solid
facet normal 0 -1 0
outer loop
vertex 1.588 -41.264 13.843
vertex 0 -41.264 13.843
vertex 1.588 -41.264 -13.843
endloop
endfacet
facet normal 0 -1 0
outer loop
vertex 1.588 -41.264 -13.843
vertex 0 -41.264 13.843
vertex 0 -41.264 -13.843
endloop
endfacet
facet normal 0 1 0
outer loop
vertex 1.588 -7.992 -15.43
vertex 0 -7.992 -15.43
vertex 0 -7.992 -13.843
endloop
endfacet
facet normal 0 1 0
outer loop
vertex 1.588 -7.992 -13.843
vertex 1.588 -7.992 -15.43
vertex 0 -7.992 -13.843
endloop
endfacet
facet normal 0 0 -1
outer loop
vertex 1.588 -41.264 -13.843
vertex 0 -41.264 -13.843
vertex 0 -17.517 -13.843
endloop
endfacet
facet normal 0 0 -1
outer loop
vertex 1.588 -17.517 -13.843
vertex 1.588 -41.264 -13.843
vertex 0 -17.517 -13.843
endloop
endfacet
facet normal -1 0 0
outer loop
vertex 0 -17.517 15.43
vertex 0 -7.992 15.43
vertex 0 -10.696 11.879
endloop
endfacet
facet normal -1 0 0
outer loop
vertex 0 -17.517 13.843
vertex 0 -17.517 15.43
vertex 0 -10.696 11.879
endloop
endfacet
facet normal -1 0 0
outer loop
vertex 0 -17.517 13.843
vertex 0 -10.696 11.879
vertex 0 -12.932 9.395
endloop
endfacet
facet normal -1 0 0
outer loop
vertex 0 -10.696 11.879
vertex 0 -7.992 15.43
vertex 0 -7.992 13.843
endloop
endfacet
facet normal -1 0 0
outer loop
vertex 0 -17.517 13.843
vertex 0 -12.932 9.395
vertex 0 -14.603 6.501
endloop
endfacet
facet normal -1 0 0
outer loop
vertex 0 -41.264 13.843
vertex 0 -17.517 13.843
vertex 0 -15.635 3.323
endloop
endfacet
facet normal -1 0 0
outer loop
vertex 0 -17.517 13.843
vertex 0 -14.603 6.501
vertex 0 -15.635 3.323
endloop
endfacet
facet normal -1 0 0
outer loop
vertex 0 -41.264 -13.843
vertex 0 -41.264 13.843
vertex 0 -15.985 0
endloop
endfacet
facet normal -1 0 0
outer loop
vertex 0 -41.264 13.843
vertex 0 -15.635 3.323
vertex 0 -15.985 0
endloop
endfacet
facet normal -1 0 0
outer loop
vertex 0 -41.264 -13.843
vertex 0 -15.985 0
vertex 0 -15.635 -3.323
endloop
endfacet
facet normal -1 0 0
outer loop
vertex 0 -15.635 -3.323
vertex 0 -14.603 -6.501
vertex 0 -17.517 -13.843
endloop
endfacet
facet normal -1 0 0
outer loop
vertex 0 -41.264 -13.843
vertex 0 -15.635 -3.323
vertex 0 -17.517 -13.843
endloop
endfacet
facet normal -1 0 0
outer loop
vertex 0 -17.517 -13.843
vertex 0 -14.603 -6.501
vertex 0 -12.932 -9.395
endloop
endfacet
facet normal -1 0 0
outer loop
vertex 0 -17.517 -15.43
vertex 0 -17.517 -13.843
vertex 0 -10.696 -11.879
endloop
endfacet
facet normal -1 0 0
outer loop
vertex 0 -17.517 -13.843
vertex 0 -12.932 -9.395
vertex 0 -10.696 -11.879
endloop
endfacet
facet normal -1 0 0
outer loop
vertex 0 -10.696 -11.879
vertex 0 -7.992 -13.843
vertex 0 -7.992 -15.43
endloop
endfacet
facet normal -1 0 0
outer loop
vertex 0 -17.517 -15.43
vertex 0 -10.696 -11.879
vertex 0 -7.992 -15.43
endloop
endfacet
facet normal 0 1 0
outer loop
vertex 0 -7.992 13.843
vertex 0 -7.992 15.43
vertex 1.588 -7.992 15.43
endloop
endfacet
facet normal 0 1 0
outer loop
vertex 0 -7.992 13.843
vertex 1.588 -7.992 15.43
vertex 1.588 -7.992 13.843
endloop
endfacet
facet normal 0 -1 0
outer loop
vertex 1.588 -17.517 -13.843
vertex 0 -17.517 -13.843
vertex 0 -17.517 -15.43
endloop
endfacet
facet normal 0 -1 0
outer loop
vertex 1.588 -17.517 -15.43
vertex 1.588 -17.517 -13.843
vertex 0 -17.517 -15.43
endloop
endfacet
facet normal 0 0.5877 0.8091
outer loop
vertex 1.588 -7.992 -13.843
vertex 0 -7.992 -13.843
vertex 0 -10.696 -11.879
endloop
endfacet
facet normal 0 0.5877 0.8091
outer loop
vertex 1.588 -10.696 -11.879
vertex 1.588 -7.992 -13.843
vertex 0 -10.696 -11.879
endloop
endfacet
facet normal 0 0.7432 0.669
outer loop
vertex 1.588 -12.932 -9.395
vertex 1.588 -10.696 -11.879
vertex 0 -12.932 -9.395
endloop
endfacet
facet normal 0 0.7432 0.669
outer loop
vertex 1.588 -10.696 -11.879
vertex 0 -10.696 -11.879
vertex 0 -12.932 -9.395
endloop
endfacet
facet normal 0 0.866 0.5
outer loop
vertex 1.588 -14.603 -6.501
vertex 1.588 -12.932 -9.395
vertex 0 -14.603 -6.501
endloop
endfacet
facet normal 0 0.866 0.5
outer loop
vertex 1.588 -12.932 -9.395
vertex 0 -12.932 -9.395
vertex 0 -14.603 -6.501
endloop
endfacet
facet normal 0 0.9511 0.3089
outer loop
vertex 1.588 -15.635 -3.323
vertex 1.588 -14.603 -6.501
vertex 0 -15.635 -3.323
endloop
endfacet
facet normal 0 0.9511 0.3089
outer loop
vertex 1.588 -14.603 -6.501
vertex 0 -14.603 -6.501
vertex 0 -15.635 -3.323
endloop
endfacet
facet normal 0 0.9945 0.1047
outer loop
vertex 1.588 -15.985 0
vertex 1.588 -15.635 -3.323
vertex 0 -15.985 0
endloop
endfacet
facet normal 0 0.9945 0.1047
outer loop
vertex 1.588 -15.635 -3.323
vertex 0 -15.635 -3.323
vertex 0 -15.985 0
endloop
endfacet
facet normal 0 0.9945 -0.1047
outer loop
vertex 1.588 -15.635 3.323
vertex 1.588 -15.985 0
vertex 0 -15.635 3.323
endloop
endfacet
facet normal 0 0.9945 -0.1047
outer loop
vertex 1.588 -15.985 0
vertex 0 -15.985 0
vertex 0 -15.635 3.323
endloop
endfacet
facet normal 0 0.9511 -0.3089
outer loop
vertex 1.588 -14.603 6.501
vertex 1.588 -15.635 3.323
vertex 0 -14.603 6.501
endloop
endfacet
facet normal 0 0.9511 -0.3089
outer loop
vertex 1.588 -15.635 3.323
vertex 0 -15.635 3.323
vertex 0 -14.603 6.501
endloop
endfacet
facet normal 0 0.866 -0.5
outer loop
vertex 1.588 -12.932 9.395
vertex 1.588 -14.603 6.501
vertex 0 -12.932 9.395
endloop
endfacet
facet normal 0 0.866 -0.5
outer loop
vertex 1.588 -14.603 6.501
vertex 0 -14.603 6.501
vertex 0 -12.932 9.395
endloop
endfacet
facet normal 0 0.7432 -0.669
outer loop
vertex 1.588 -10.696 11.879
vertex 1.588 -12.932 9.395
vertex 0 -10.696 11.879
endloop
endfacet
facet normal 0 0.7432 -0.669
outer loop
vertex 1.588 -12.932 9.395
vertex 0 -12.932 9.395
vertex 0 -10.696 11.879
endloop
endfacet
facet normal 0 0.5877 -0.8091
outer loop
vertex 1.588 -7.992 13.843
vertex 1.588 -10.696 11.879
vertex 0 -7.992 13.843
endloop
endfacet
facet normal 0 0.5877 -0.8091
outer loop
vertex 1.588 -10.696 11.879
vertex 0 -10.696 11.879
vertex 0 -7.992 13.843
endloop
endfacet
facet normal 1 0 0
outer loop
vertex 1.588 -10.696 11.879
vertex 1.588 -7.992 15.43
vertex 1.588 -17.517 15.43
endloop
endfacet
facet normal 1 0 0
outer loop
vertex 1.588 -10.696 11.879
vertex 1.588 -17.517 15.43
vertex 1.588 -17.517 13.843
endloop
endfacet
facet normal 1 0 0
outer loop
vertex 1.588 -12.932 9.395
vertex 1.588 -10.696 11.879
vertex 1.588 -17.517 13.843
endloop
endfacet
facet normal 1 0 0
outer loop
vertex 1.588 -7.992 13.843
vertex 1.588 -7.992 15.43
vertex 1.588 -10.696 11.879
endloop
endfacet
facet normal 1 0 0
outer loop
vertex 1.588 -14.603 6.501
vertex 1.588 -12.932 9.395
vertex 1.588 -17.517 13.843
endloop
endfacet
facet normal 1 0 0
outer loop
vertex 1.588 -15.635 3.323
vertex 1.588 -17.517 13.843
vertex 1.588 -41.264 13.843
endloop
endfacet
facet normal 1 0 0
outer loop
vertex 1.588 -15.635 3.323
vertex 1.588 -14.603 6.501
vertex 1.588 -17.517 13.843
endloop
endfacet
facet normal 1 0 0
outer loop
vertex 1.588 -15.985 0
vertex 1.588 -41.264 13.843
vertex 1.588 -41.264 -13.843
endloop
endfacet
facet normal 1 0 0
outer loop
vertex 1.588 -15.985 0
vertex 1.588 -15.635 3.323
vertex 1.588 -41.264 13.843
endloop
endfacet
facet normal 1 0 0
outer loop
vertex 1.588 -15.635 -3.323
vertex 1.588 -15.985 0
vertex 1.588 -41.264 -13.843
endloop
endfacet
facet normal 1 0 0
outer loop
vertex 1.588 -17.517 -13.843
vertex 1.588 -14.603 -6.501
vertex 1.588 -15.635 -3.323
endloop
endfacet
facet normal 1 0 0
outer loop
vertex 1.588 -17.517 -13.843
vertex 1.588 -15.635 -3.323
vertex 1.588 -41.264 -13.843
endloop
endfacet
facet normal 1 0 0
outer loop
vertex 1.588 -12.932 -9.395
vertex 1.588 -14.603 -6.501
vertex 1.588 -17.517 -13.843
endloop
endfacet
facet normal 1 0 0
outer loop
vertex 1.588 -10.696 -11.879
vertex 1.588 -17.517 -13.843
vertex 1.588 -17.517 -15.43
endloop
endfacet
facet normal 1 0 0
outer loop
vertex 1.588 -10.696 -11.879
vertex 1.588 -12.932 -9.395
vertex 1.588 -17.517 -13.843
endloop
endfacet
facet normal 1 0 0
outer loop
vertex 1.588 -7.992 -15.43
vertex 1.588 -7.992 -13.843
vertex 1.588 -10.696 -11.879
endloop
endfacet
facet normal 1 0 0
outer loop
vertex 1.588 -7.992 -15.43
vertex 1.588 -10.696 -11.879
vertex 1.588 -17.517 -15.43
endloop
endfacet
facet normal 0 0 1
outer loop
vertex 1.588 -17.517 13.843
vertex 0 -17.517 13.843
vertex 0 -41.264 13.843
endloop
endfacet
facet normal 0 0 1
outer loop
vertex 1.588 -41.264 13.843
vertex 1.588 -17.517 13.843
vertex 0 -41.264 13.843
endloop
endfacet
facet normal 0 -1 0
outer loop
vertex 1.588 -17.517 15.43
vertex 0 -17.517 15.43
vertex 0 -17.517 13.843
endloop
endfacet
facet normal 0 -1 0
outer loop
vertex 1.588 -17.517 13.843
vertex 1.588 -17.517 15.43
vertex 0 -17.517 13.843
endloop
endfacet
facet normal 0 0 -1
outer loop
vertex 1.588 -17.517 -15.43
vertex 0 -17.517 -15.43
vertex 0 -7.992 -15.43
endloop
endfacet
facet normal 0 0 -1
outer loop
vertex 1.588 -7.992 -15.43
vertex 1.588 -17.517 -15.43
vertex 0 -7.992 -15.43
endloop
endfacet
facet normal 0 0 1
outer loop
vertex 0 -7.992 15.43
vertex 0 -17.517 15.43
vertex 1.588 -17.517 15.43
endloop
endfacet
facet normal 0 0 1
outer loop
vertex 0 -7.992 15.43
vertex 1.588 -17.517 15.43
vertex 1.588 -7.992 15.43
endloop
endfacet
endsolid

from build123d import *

# Parameters (mm, degrees)
SKETCH1_W           = 1.5875
SKETCH1_H           = 9.525
BOSS_EXTRUDE1_DEPTH = 1.5875


with BuildPart() as part:
    # Sketch1 → Boss-Extrude1 (new body)
    with BuildSketch(Plane(origin=(0, 0, 0), x_dir=(0, 0, -1), z_dir=(1, 0, 0))):
        with BuildLine():
            ThreePointArc((13.843, -7.992259776), (0, -15.984519553), (-13.843, -7.992259776))
            Line((-13.843, -7.992259776), (-13.843, -17.517259776))
            Line((-13.843, -17.517259776), (-13.843, -41.26395491))
            Line((-13.843, -41.26395491), (13.843, -41.26395491))
            Line((13.843, -41.26395491), (13.843, -17.517259776))
            Line((13.843, -17.517259776), (15.4305, -17.517259776))
            Line((15.4305, -17.517259776), (15.4305, -7.992259776))
            Line((15.4305, -7.992259776), (13.843, -7.992259776))
        make_face()
        with Locations((-14.63675, -12.754759776)):
            Rectangle(SKETCH1_W, SKETCH1_H)
    extrude(amount=BOSS_EXTRUDE1_DEPTH)


solid = part.part
